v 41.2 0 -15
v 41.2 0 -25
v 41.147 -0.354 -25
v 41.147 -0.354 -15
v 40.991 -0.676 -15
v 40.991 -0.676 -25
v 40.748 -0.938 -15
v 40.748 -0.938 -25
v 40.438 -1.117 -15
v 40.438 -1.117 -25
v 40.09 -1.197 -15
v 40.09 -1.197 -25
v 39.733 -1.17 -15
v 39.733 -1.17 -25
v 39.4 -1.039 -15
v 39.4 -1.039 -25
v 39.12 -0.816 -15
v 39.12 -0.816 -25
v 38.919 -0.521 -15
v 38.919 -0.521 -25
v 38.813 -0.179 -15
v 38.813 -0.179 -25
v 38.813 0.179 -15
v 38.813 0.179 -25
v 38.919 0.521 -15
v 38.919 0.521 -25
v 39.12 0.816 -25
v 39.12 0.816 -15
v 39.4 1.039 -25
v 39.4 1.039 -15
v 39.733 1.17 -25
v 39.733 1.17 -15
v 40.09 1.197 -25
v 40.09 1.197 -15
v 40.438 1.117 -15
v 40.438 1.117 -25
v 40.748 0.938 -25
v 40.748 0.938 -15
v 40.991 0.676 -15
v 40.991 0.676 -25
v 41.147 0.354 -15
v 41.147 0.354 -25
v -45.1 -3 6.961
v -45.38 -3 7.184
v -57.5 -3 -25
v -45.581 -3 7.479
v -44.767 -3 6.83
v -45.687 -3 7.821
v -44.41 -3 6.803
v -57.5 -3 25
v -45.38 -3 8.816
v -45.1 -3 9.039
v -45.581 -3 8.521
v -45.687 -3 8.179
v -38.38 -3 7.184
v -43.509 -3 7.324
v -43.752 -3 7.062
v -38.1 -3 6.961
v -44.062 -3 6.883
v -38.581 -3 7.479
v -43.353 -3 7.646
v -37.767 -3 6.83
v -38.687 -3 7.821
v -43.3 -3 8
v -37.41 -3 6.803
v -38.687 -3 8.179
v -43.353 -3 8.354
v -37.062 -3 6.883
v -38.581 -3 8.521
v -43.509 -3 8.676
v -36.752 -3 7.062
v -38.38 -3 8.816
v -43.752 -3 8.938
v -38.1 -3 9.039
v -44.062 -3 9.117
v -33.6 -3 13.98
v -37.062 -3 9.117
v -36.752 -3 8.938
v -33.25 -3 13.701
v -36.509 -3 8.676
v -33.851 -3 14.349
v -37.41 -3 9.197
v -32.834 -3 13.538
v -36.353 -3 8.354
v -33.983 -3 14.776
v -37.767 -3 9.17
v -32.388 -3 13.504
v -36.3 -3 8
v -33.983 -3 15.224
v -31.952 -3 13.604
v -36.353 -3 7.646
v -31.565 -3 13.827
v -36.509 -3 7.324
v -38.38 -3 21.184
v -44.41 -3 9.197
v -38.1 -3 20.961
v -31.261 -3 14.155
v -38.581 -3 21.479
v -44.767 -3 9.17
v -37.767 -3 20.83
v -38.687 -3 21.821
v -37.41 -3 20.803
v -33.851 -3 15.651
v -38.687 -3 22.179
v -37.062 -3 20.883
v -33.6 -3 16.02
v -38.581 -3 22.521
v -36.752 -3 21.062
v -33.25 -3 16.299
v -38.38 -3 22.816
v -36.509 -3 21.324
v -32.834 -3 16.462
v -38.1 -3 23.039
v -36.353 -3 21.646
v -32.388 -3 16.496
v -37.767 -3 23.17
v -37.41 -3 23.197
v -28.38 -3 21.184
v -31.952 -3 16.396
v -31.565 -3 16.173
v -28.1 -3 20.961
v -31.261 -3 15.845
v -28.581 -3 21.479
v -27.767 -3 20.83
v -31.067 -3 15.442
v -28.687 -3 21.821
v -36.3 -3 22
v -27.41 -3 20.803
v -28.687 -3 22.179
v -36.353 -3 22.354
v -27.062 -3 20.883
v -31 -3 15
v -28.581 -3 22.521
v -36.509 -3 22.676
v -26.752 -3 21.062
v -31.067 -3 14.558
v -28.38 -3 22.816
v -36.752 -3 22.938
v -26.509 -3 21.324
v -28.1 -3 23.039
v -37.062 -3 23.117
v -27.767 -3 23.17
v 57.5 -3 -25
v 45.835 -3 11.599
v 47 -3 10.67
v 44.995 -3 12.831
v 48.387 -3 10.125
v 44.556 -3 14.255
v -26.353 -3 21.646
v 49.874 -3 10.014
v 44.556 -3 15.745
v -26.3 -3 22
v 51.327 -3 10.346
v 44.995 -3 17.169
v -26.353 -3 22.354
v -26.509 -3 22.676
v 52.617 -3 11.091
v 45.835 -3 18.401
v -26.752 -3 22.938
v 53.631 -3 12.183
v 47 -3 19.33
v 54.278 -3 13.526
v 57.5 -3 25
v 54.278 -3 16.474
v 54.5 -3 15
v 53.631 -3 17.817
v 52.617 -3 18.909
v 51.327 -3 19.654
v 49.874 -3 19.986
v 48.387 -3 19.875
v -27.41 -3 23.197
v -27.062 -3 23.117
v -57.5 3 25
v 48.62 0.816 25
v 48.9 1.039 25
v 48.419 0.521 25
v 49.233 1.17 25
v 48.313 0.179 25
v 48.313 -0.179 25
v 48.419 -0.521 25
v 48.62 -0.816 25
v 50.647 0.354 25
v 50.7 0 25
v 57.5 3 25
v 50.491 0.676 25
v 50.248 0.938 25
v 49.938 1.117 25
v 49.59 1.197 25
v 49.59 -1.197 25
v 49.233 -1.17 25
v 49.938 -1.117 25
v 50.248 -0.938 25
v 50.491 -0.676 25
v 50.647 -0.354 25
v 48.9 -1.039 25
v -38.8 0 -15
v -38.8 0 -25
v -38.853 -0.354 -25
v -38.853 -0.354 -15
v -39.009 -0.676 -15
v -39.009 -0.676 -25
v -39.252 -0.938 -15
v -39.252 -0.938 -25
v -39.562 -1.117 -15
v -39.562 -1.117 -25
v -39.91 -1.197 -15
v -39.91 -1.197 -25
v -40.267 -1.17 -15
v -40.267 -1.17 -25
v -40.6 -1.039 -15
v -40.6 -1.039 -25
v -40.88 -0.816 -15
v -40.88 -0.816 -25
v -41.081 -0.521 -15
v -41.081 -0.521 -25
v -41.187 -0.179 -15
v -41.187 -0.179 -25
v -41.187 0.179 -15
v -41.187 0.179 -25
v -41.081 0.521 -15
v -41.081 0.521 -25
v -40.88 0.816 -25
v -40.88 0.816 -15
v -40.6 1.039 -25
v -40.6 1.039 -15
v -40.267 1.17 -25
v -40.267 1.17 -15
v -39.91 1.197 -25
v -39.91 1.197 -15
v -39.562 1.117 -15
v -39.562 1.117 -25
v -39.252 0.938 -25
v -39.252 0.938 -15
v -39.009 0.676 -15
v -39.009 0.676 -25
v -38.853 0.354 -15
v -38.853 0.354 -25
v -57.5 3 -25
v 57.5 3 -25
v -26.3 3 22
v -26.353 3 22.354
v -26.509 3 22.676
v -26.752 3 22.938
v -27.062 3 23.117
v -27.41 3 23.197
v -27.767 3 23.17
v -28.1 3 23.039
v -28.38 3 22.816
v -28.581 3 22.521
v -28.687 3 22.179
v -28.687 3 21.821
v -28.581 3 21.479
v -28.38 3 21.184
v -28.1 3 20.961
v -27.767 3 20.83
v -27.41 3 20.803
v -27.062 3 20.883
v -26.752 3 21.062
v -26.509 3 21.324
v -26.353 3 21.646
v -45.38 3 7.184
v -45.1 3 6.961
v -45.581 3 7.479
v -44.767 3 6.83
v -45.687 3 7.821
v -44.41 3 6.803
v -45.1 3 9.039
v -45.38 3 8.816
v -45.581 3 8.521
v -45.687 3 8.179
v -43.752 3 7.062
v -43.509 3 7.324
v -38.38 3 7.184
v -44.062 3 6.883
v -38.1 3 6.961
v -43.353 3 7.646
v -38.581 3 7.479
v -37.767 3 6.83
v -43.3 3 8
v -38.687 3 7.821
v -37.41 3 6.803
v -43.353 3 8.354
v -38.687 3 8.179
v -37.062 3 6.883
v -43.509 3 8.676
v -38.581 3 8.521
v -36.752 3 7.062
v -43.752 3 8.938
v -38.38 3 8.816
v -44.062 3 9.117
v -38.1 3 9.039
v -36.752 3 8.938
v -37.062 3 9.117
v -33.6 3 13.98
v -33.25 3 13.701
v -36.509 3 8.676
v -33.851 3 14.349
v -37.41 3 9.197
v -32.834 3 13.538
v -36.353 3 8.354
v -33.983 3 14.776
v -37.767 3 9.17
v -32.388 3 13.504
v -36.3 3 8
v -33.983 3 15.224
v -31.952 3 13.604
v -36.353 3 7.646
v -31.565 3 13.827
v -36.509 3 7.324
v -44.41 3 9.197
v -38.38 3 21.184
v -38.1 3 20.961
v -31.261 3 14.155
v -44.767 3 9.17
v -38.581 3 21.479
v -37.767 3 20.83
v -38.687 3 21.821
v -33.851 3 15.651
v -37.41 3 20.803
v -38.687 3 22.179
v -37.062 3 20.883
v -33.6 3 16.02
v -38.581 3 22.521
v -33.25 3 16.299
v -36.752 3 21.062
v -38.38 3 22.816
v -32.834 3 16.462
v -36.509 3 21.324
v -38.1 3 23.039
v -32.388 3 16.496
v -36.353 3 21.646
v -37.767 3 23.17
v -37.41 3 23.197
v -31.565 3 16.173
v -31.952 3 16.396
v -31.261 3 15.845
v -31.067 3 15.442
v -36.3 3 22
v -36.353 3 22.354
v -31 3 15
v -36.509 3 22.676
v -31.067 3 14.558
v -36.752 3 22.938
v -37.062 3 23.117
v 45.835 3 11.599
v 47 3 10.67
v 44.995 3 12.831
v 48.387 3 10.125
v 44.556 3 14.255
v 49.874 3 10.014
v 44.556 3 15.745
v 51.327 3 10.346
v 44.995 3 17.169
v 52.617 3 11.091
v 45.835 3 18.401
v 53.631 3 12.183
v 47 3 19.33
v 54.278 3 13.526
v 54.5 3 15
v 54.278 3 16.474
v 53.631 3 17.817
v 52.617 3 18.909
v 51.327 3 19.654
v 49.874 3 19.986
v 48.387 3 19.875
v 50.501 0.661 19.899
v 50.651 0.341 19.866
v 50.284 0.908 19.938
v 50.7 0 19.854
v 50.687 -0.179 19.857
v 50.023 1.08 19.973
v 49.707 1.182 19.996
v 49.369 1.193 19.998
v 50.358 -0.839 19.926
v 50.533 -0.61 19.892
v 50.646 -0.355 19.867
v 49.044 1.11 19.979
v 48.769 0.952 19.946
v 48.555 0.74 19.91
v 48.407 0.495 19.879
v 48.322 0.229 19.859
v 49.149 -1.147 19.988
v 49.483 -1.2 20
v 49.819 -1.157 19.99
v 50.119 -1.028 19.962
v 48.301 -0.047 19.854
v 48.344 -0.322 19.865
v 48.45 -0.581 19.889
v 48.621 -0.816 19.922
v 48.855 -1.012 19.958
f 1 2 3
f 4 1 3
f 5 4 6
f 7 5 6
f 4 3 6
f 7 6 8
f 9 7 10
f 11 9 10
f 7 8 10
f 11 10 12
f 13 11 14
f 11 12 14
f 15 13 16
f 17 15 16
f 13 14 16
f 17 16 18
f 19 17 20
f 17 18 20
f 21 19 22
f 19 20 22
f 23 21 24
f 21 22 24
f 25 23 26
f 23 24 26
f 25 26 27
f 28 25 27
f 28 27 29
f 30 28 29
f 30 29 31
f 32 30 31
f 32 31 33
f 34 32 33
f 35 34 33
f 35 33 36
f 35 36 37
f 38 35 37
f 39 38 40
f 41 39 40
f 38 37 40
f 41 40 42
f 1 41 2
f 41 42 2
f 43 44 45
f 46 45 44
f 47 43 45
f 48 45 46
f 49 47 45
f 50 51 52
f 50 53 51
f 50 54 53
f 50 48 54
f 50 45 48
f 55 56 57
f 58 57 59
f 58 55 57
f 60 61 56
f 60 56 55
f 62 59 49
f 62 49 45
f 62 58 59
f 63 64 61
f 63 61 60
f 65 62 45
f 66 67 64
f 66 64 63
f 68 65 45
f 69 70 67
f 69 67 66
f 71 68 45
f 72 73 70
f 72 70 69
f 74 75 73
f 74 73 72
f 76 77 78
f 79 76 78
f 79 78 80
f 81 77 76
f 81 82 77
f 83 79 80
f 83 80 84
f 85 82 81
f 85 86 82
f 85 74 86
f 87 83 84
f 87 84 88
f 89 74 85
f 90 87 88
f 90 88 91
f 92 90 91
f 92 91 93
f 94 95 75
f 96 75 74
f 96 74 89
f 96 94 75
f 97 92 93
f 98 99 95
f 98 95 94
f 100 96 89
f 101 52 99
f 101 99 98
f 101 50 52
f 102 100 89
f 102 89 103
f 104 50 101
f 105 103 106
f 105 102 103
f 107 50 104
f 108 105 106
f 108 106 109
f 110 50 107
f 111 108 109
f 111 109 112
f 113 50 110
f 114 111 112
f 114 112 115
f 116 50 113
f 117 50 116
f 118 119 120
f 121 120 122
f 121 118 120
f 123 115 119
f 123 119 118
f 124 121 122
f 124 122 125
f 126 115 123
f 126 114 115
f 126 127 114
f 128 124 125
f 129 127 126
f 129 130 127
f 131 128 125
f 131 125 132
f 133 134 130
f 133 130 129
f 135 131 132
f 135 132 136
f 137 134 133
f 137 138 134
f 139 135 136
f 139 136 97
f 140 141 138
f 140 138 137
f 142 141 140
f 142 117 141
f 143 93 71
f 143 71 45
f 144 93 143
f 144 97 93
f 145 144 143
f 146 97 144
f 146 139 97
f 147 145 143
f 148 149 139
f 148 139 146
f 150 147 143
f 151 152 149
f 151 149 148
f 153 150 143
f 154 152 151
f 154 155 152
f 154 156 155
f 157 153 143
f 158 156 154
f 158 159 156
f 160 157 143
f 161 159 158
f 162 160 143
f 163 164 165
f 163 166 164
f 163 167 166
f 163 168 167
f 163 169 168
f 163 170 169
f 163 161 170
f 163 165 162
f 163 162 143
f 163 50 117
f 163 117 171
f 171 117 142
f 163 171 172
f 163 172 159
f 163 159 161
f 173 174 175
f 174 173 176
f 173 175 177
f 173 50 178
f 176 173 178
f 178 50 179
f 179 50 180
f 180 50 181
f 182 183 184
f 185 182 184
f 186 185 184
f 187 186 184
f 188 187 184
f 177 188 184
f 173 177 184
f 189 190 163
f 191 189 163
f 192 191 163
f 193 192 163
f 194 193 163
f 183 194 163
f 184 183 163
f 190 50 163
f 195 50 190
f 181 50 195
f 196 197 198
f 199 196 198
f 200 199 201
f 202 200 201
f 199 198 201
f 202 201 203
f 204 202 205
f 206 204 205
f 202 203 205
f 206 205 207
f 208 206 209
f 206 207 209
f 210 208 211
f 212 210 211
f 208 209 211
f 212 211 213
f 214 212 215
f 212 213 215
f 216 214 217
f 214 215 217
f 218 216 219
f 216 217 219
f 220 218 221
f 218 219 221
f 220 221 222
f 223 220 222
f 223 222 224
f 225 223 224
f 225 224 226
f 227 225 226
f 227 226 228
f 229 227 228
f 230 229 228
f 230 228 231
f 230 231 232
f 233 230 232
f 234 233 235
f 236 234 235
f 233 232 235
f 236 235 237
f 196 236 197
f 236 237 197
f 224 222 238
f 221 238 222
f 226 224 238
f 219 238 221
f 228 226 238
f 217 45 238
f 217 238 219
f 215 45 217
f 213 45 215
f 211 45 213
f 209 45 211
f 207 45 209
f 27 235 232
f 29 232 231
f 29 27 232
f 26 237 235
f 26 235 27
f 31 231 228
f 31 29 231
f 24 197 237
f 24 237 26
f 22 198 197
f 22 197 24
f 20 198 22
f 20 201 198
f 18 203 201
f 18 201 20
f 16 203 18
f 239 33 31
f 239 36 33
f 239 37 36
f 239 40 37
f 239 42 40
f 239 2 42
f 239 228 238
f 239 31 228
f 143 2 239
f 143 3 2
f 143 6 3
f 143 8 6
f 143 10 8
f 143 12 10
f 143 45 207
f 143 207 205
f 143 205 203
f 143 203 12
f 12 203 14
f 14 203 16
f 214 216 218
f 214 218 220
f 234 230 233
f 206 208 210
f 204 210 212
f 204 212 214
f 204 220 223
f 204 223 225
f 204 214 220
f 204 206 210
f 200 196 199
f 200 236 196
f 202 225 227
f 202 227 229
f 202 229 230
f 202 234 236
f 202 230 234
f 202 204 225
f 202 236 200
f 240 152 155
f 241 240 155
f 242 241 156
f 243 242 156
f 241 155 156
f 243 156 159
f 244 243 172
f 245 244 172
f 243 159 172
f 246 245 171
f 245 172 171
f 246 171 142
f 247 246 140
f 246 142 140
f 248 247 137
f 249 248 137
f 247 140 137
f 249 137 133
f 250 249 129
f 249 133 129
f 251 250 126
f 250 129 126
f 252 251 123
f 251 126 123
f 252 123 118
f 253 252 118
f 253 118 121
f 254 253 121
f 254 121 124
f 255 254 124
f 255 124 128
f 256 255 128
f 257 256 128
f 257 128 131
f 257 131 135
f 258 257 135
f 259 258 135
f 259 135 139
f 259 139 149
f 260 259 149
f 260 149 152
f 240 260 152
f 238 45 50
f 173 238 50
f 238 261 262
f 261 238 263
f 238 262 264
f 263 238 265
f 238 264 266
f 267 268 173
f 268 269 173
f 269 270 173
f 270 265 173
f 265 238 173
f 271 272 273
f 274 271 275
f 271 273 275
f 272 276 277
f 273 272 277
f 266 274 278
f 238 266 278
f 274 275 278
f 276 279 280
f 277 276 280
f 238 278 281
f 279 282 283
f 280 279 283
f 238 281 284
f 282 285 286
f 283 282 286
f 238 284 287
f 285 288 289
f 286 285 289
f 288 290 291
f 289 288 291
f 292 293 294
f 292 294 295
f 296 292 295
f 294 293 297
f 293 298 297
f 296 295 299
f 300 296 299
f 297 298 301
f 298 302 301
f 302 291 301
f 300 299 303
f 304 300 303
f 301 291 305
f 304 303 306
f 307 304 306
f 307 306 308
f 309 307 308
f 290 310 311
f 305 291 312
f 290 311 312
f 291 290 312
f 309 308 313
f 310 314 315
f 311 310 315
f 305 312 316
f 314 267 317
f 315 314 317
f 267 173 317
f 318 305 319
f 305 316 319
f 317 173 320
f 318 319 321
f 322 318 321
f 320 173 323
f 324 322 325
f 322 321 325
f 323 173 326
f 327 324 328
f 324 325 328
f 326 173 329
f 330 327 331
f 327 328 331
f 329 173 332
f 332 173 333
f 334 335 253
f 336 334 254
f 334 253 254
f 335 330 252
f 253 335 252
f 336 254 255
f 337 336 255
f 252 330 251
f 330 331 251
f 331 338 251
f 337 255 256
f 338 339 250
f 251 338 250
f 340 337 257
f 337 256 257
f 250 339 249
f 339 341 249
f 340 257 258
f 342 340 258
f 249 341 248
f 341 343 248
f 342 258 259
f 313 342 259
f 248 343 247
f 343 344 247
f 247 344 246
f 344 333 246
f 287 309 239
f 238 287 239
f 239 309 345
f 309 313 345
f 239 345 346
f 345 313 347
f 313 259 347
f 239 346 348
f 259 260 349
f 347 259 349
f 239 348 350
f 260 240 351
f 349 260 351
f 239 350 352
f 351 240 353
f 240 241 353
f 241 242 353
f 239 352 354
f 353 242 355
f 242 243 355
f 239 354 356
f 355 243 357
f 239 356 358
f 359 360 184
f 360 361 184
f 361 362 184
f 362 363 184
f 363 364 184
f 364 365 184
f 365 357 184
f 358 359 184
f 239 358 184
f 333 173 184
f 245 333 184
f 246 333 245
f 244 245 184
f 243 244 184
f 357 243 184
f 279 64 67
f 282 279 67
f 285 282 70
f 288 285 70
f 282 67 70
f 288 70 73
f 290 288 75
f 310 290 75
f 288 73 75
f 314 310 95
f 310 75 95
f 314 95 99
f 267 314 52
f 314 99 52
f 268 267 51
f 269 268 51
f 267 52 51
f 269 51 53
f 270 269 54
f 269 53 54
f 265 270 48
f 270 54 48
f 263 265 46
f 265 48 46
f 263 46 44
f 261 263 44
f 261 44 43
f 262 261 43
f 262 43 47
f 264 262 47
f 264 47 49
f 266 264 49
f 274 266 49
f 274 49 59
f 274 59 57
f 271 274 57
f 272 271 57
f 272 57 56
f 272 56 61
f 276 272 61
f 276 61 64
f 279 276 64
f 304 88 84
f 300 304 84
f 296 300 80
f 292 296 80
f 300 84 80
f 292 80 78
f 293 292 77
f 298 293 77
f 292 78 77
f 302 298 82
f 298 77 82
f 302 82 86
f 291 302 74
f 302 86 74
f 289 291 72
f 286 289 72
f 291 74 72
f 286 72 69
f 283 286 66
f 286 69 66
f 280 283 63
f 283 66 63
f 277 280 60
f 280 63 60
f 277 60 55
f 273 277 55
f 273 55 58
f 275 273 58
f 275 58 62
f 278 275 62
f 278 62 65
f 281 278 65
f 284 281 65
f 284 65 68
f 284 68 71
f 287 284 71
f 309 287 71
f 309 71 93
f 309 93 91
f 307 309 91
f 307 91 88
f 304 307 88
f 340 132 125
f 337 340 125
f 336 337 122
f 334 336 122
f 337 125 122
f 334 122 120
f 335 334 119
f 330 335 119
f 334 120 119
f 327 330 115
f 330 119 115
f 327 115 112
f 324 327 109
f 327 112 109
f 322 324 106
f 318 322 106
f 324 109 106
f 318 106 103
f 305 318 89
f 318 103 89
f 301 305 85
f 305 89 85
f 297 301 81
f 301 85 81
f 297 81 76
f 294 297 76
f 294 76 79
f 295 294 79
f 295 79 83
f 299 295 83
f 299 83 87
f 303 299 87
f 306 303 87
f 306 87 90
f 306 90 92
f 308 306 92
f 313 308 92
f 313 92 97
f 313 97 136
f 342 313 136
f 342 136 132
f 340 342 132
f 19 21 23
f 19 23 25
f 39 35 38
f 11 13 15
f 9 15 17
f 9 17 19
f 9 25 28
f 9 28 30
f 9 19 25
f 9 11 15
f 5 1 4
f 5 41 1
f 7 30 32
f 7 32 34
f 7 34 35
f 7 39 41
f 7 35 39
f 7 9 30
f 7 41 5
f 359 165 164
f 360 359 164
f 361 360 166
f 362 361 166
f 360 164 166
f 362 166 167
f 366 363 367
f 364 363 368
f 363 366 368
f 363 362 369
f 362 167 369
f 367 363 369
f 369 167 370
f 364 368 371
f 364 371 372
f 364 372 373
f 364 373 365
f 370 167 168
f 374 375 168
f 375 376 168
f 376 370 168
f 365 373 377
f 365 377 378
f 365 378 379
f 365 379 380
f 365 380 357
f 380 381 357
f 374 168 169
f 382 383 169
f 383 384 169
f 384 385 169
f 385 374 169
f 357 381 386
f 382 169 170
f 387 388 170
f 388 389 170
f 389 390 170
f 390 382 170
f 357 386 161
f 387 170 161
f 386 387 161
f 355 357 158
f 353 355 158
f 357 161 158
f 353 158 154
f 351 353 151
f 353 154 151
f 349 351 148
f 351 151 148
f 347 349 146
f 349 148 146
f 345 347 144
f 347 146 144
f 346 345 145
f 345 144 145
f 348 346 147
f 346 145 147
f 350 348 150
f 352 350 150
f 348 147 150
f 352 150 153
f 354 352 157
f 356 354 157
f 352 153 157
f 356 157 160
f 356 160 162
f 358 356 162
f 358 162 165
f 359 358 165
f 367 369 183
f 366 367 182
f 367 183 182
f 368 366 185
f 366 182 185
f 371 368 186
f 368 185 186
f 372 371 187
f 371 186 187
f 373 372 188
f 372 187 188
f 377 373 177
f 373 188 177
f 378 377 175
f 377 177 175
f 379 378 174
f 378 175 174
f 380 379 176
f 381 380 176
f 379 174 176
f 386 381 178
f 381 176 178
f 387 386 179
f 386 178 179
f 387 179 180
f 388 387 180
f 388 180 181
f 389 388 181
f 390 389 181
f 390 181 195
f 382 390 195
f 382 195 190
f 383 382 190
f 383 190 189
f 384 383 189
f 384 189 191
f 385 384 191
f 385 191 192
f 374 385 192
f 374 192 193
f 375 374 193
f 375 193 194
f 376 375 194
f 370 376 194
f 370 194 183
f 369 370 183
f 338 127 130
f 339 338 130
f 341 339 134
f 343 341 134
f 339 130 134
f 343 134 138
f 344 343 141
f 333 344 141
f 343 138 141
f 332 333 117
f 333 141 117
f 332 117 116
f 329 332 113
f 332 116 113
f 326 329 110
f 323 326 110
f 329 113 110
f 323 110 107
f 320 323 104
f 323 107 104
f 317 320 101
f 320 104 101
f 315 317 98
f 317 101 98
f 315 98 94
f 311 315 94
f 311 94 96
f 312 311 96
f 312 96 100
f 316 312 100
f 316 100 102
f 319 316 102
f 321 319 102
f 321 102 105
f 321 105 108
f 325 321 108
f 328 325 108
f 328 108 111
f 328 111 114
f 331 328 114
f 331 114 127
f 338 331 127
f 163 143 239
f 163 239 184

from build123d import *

# Parameters (mm, degrees)
F0_W          = 115
F0_H          = 50
F1_DEPTH      = 3
F1_DEPTH_BACK = 3
F2_R          = 5
F2_R_2        = 1.2
F2_R_3        = 1.5
F3_DEPTH      = 6.001
F4_R          = 1.2
F5_DEPTH      = 5.1471356602
F6_R          = 1.2
F7_DEPTH      = 10


with BuildPart() as f1:
    # F0 (on Front) → F1 (new body, two sides)
    with BuildSketch(Plane.XZ) as f1_sk:
        Rectangle(F0_W, F0_H)
    extrude(amount=F1_DEPTH)
    extrude(f1_sk.sketch, amount=-F1_DEPTH_BACK)

    # F2 (on face) → F3 (cut, through all)
    with BuildSketch(Plane.XZ.offset(3)):
        with Locations((49.5, 15)):
            Circle(F2_R)
        with Locations((-37.5, 22)):
            Circle(F2_R_2)
        with Locations((-27.5, 22)):
            Circle(F2_R_2)
        with Locations((-32.5, 15)):
            Circle(F2_R_3)
        with Locations((-37.5, 8)):
            Circle(F2_R_2)
        with Locations((-44.5, 8)):
            Circle(F2_R_2)
    extrude(amount=-F3_DEPTH, mode=Mode.SUBTRACT)

    # F4 (on face) → F5 (cut, through all)
    with BuildSketch(Plane.XY.offset(25)):
        with Locations((49.5, 0)):
            Circle(F4_R)
    extrude(amount=-F5_DEPTH, mode=Mode.SUBTRACT)

    # F6 (on face) → F7 (cut)
    with BuildSketch(Plane(origin=(0, 0, -25), x_dir=(1, 0, 0), z_dir=(0, 0, -1))):
        with Locations((-40, 0)):
            Circle(F6_R)
        with Locations((40, 0)):
            Circle(F6_R)
    extrude(amount=-F7_DEPTH, mode=Mode.SUBTRACT)


solid = f1.part
